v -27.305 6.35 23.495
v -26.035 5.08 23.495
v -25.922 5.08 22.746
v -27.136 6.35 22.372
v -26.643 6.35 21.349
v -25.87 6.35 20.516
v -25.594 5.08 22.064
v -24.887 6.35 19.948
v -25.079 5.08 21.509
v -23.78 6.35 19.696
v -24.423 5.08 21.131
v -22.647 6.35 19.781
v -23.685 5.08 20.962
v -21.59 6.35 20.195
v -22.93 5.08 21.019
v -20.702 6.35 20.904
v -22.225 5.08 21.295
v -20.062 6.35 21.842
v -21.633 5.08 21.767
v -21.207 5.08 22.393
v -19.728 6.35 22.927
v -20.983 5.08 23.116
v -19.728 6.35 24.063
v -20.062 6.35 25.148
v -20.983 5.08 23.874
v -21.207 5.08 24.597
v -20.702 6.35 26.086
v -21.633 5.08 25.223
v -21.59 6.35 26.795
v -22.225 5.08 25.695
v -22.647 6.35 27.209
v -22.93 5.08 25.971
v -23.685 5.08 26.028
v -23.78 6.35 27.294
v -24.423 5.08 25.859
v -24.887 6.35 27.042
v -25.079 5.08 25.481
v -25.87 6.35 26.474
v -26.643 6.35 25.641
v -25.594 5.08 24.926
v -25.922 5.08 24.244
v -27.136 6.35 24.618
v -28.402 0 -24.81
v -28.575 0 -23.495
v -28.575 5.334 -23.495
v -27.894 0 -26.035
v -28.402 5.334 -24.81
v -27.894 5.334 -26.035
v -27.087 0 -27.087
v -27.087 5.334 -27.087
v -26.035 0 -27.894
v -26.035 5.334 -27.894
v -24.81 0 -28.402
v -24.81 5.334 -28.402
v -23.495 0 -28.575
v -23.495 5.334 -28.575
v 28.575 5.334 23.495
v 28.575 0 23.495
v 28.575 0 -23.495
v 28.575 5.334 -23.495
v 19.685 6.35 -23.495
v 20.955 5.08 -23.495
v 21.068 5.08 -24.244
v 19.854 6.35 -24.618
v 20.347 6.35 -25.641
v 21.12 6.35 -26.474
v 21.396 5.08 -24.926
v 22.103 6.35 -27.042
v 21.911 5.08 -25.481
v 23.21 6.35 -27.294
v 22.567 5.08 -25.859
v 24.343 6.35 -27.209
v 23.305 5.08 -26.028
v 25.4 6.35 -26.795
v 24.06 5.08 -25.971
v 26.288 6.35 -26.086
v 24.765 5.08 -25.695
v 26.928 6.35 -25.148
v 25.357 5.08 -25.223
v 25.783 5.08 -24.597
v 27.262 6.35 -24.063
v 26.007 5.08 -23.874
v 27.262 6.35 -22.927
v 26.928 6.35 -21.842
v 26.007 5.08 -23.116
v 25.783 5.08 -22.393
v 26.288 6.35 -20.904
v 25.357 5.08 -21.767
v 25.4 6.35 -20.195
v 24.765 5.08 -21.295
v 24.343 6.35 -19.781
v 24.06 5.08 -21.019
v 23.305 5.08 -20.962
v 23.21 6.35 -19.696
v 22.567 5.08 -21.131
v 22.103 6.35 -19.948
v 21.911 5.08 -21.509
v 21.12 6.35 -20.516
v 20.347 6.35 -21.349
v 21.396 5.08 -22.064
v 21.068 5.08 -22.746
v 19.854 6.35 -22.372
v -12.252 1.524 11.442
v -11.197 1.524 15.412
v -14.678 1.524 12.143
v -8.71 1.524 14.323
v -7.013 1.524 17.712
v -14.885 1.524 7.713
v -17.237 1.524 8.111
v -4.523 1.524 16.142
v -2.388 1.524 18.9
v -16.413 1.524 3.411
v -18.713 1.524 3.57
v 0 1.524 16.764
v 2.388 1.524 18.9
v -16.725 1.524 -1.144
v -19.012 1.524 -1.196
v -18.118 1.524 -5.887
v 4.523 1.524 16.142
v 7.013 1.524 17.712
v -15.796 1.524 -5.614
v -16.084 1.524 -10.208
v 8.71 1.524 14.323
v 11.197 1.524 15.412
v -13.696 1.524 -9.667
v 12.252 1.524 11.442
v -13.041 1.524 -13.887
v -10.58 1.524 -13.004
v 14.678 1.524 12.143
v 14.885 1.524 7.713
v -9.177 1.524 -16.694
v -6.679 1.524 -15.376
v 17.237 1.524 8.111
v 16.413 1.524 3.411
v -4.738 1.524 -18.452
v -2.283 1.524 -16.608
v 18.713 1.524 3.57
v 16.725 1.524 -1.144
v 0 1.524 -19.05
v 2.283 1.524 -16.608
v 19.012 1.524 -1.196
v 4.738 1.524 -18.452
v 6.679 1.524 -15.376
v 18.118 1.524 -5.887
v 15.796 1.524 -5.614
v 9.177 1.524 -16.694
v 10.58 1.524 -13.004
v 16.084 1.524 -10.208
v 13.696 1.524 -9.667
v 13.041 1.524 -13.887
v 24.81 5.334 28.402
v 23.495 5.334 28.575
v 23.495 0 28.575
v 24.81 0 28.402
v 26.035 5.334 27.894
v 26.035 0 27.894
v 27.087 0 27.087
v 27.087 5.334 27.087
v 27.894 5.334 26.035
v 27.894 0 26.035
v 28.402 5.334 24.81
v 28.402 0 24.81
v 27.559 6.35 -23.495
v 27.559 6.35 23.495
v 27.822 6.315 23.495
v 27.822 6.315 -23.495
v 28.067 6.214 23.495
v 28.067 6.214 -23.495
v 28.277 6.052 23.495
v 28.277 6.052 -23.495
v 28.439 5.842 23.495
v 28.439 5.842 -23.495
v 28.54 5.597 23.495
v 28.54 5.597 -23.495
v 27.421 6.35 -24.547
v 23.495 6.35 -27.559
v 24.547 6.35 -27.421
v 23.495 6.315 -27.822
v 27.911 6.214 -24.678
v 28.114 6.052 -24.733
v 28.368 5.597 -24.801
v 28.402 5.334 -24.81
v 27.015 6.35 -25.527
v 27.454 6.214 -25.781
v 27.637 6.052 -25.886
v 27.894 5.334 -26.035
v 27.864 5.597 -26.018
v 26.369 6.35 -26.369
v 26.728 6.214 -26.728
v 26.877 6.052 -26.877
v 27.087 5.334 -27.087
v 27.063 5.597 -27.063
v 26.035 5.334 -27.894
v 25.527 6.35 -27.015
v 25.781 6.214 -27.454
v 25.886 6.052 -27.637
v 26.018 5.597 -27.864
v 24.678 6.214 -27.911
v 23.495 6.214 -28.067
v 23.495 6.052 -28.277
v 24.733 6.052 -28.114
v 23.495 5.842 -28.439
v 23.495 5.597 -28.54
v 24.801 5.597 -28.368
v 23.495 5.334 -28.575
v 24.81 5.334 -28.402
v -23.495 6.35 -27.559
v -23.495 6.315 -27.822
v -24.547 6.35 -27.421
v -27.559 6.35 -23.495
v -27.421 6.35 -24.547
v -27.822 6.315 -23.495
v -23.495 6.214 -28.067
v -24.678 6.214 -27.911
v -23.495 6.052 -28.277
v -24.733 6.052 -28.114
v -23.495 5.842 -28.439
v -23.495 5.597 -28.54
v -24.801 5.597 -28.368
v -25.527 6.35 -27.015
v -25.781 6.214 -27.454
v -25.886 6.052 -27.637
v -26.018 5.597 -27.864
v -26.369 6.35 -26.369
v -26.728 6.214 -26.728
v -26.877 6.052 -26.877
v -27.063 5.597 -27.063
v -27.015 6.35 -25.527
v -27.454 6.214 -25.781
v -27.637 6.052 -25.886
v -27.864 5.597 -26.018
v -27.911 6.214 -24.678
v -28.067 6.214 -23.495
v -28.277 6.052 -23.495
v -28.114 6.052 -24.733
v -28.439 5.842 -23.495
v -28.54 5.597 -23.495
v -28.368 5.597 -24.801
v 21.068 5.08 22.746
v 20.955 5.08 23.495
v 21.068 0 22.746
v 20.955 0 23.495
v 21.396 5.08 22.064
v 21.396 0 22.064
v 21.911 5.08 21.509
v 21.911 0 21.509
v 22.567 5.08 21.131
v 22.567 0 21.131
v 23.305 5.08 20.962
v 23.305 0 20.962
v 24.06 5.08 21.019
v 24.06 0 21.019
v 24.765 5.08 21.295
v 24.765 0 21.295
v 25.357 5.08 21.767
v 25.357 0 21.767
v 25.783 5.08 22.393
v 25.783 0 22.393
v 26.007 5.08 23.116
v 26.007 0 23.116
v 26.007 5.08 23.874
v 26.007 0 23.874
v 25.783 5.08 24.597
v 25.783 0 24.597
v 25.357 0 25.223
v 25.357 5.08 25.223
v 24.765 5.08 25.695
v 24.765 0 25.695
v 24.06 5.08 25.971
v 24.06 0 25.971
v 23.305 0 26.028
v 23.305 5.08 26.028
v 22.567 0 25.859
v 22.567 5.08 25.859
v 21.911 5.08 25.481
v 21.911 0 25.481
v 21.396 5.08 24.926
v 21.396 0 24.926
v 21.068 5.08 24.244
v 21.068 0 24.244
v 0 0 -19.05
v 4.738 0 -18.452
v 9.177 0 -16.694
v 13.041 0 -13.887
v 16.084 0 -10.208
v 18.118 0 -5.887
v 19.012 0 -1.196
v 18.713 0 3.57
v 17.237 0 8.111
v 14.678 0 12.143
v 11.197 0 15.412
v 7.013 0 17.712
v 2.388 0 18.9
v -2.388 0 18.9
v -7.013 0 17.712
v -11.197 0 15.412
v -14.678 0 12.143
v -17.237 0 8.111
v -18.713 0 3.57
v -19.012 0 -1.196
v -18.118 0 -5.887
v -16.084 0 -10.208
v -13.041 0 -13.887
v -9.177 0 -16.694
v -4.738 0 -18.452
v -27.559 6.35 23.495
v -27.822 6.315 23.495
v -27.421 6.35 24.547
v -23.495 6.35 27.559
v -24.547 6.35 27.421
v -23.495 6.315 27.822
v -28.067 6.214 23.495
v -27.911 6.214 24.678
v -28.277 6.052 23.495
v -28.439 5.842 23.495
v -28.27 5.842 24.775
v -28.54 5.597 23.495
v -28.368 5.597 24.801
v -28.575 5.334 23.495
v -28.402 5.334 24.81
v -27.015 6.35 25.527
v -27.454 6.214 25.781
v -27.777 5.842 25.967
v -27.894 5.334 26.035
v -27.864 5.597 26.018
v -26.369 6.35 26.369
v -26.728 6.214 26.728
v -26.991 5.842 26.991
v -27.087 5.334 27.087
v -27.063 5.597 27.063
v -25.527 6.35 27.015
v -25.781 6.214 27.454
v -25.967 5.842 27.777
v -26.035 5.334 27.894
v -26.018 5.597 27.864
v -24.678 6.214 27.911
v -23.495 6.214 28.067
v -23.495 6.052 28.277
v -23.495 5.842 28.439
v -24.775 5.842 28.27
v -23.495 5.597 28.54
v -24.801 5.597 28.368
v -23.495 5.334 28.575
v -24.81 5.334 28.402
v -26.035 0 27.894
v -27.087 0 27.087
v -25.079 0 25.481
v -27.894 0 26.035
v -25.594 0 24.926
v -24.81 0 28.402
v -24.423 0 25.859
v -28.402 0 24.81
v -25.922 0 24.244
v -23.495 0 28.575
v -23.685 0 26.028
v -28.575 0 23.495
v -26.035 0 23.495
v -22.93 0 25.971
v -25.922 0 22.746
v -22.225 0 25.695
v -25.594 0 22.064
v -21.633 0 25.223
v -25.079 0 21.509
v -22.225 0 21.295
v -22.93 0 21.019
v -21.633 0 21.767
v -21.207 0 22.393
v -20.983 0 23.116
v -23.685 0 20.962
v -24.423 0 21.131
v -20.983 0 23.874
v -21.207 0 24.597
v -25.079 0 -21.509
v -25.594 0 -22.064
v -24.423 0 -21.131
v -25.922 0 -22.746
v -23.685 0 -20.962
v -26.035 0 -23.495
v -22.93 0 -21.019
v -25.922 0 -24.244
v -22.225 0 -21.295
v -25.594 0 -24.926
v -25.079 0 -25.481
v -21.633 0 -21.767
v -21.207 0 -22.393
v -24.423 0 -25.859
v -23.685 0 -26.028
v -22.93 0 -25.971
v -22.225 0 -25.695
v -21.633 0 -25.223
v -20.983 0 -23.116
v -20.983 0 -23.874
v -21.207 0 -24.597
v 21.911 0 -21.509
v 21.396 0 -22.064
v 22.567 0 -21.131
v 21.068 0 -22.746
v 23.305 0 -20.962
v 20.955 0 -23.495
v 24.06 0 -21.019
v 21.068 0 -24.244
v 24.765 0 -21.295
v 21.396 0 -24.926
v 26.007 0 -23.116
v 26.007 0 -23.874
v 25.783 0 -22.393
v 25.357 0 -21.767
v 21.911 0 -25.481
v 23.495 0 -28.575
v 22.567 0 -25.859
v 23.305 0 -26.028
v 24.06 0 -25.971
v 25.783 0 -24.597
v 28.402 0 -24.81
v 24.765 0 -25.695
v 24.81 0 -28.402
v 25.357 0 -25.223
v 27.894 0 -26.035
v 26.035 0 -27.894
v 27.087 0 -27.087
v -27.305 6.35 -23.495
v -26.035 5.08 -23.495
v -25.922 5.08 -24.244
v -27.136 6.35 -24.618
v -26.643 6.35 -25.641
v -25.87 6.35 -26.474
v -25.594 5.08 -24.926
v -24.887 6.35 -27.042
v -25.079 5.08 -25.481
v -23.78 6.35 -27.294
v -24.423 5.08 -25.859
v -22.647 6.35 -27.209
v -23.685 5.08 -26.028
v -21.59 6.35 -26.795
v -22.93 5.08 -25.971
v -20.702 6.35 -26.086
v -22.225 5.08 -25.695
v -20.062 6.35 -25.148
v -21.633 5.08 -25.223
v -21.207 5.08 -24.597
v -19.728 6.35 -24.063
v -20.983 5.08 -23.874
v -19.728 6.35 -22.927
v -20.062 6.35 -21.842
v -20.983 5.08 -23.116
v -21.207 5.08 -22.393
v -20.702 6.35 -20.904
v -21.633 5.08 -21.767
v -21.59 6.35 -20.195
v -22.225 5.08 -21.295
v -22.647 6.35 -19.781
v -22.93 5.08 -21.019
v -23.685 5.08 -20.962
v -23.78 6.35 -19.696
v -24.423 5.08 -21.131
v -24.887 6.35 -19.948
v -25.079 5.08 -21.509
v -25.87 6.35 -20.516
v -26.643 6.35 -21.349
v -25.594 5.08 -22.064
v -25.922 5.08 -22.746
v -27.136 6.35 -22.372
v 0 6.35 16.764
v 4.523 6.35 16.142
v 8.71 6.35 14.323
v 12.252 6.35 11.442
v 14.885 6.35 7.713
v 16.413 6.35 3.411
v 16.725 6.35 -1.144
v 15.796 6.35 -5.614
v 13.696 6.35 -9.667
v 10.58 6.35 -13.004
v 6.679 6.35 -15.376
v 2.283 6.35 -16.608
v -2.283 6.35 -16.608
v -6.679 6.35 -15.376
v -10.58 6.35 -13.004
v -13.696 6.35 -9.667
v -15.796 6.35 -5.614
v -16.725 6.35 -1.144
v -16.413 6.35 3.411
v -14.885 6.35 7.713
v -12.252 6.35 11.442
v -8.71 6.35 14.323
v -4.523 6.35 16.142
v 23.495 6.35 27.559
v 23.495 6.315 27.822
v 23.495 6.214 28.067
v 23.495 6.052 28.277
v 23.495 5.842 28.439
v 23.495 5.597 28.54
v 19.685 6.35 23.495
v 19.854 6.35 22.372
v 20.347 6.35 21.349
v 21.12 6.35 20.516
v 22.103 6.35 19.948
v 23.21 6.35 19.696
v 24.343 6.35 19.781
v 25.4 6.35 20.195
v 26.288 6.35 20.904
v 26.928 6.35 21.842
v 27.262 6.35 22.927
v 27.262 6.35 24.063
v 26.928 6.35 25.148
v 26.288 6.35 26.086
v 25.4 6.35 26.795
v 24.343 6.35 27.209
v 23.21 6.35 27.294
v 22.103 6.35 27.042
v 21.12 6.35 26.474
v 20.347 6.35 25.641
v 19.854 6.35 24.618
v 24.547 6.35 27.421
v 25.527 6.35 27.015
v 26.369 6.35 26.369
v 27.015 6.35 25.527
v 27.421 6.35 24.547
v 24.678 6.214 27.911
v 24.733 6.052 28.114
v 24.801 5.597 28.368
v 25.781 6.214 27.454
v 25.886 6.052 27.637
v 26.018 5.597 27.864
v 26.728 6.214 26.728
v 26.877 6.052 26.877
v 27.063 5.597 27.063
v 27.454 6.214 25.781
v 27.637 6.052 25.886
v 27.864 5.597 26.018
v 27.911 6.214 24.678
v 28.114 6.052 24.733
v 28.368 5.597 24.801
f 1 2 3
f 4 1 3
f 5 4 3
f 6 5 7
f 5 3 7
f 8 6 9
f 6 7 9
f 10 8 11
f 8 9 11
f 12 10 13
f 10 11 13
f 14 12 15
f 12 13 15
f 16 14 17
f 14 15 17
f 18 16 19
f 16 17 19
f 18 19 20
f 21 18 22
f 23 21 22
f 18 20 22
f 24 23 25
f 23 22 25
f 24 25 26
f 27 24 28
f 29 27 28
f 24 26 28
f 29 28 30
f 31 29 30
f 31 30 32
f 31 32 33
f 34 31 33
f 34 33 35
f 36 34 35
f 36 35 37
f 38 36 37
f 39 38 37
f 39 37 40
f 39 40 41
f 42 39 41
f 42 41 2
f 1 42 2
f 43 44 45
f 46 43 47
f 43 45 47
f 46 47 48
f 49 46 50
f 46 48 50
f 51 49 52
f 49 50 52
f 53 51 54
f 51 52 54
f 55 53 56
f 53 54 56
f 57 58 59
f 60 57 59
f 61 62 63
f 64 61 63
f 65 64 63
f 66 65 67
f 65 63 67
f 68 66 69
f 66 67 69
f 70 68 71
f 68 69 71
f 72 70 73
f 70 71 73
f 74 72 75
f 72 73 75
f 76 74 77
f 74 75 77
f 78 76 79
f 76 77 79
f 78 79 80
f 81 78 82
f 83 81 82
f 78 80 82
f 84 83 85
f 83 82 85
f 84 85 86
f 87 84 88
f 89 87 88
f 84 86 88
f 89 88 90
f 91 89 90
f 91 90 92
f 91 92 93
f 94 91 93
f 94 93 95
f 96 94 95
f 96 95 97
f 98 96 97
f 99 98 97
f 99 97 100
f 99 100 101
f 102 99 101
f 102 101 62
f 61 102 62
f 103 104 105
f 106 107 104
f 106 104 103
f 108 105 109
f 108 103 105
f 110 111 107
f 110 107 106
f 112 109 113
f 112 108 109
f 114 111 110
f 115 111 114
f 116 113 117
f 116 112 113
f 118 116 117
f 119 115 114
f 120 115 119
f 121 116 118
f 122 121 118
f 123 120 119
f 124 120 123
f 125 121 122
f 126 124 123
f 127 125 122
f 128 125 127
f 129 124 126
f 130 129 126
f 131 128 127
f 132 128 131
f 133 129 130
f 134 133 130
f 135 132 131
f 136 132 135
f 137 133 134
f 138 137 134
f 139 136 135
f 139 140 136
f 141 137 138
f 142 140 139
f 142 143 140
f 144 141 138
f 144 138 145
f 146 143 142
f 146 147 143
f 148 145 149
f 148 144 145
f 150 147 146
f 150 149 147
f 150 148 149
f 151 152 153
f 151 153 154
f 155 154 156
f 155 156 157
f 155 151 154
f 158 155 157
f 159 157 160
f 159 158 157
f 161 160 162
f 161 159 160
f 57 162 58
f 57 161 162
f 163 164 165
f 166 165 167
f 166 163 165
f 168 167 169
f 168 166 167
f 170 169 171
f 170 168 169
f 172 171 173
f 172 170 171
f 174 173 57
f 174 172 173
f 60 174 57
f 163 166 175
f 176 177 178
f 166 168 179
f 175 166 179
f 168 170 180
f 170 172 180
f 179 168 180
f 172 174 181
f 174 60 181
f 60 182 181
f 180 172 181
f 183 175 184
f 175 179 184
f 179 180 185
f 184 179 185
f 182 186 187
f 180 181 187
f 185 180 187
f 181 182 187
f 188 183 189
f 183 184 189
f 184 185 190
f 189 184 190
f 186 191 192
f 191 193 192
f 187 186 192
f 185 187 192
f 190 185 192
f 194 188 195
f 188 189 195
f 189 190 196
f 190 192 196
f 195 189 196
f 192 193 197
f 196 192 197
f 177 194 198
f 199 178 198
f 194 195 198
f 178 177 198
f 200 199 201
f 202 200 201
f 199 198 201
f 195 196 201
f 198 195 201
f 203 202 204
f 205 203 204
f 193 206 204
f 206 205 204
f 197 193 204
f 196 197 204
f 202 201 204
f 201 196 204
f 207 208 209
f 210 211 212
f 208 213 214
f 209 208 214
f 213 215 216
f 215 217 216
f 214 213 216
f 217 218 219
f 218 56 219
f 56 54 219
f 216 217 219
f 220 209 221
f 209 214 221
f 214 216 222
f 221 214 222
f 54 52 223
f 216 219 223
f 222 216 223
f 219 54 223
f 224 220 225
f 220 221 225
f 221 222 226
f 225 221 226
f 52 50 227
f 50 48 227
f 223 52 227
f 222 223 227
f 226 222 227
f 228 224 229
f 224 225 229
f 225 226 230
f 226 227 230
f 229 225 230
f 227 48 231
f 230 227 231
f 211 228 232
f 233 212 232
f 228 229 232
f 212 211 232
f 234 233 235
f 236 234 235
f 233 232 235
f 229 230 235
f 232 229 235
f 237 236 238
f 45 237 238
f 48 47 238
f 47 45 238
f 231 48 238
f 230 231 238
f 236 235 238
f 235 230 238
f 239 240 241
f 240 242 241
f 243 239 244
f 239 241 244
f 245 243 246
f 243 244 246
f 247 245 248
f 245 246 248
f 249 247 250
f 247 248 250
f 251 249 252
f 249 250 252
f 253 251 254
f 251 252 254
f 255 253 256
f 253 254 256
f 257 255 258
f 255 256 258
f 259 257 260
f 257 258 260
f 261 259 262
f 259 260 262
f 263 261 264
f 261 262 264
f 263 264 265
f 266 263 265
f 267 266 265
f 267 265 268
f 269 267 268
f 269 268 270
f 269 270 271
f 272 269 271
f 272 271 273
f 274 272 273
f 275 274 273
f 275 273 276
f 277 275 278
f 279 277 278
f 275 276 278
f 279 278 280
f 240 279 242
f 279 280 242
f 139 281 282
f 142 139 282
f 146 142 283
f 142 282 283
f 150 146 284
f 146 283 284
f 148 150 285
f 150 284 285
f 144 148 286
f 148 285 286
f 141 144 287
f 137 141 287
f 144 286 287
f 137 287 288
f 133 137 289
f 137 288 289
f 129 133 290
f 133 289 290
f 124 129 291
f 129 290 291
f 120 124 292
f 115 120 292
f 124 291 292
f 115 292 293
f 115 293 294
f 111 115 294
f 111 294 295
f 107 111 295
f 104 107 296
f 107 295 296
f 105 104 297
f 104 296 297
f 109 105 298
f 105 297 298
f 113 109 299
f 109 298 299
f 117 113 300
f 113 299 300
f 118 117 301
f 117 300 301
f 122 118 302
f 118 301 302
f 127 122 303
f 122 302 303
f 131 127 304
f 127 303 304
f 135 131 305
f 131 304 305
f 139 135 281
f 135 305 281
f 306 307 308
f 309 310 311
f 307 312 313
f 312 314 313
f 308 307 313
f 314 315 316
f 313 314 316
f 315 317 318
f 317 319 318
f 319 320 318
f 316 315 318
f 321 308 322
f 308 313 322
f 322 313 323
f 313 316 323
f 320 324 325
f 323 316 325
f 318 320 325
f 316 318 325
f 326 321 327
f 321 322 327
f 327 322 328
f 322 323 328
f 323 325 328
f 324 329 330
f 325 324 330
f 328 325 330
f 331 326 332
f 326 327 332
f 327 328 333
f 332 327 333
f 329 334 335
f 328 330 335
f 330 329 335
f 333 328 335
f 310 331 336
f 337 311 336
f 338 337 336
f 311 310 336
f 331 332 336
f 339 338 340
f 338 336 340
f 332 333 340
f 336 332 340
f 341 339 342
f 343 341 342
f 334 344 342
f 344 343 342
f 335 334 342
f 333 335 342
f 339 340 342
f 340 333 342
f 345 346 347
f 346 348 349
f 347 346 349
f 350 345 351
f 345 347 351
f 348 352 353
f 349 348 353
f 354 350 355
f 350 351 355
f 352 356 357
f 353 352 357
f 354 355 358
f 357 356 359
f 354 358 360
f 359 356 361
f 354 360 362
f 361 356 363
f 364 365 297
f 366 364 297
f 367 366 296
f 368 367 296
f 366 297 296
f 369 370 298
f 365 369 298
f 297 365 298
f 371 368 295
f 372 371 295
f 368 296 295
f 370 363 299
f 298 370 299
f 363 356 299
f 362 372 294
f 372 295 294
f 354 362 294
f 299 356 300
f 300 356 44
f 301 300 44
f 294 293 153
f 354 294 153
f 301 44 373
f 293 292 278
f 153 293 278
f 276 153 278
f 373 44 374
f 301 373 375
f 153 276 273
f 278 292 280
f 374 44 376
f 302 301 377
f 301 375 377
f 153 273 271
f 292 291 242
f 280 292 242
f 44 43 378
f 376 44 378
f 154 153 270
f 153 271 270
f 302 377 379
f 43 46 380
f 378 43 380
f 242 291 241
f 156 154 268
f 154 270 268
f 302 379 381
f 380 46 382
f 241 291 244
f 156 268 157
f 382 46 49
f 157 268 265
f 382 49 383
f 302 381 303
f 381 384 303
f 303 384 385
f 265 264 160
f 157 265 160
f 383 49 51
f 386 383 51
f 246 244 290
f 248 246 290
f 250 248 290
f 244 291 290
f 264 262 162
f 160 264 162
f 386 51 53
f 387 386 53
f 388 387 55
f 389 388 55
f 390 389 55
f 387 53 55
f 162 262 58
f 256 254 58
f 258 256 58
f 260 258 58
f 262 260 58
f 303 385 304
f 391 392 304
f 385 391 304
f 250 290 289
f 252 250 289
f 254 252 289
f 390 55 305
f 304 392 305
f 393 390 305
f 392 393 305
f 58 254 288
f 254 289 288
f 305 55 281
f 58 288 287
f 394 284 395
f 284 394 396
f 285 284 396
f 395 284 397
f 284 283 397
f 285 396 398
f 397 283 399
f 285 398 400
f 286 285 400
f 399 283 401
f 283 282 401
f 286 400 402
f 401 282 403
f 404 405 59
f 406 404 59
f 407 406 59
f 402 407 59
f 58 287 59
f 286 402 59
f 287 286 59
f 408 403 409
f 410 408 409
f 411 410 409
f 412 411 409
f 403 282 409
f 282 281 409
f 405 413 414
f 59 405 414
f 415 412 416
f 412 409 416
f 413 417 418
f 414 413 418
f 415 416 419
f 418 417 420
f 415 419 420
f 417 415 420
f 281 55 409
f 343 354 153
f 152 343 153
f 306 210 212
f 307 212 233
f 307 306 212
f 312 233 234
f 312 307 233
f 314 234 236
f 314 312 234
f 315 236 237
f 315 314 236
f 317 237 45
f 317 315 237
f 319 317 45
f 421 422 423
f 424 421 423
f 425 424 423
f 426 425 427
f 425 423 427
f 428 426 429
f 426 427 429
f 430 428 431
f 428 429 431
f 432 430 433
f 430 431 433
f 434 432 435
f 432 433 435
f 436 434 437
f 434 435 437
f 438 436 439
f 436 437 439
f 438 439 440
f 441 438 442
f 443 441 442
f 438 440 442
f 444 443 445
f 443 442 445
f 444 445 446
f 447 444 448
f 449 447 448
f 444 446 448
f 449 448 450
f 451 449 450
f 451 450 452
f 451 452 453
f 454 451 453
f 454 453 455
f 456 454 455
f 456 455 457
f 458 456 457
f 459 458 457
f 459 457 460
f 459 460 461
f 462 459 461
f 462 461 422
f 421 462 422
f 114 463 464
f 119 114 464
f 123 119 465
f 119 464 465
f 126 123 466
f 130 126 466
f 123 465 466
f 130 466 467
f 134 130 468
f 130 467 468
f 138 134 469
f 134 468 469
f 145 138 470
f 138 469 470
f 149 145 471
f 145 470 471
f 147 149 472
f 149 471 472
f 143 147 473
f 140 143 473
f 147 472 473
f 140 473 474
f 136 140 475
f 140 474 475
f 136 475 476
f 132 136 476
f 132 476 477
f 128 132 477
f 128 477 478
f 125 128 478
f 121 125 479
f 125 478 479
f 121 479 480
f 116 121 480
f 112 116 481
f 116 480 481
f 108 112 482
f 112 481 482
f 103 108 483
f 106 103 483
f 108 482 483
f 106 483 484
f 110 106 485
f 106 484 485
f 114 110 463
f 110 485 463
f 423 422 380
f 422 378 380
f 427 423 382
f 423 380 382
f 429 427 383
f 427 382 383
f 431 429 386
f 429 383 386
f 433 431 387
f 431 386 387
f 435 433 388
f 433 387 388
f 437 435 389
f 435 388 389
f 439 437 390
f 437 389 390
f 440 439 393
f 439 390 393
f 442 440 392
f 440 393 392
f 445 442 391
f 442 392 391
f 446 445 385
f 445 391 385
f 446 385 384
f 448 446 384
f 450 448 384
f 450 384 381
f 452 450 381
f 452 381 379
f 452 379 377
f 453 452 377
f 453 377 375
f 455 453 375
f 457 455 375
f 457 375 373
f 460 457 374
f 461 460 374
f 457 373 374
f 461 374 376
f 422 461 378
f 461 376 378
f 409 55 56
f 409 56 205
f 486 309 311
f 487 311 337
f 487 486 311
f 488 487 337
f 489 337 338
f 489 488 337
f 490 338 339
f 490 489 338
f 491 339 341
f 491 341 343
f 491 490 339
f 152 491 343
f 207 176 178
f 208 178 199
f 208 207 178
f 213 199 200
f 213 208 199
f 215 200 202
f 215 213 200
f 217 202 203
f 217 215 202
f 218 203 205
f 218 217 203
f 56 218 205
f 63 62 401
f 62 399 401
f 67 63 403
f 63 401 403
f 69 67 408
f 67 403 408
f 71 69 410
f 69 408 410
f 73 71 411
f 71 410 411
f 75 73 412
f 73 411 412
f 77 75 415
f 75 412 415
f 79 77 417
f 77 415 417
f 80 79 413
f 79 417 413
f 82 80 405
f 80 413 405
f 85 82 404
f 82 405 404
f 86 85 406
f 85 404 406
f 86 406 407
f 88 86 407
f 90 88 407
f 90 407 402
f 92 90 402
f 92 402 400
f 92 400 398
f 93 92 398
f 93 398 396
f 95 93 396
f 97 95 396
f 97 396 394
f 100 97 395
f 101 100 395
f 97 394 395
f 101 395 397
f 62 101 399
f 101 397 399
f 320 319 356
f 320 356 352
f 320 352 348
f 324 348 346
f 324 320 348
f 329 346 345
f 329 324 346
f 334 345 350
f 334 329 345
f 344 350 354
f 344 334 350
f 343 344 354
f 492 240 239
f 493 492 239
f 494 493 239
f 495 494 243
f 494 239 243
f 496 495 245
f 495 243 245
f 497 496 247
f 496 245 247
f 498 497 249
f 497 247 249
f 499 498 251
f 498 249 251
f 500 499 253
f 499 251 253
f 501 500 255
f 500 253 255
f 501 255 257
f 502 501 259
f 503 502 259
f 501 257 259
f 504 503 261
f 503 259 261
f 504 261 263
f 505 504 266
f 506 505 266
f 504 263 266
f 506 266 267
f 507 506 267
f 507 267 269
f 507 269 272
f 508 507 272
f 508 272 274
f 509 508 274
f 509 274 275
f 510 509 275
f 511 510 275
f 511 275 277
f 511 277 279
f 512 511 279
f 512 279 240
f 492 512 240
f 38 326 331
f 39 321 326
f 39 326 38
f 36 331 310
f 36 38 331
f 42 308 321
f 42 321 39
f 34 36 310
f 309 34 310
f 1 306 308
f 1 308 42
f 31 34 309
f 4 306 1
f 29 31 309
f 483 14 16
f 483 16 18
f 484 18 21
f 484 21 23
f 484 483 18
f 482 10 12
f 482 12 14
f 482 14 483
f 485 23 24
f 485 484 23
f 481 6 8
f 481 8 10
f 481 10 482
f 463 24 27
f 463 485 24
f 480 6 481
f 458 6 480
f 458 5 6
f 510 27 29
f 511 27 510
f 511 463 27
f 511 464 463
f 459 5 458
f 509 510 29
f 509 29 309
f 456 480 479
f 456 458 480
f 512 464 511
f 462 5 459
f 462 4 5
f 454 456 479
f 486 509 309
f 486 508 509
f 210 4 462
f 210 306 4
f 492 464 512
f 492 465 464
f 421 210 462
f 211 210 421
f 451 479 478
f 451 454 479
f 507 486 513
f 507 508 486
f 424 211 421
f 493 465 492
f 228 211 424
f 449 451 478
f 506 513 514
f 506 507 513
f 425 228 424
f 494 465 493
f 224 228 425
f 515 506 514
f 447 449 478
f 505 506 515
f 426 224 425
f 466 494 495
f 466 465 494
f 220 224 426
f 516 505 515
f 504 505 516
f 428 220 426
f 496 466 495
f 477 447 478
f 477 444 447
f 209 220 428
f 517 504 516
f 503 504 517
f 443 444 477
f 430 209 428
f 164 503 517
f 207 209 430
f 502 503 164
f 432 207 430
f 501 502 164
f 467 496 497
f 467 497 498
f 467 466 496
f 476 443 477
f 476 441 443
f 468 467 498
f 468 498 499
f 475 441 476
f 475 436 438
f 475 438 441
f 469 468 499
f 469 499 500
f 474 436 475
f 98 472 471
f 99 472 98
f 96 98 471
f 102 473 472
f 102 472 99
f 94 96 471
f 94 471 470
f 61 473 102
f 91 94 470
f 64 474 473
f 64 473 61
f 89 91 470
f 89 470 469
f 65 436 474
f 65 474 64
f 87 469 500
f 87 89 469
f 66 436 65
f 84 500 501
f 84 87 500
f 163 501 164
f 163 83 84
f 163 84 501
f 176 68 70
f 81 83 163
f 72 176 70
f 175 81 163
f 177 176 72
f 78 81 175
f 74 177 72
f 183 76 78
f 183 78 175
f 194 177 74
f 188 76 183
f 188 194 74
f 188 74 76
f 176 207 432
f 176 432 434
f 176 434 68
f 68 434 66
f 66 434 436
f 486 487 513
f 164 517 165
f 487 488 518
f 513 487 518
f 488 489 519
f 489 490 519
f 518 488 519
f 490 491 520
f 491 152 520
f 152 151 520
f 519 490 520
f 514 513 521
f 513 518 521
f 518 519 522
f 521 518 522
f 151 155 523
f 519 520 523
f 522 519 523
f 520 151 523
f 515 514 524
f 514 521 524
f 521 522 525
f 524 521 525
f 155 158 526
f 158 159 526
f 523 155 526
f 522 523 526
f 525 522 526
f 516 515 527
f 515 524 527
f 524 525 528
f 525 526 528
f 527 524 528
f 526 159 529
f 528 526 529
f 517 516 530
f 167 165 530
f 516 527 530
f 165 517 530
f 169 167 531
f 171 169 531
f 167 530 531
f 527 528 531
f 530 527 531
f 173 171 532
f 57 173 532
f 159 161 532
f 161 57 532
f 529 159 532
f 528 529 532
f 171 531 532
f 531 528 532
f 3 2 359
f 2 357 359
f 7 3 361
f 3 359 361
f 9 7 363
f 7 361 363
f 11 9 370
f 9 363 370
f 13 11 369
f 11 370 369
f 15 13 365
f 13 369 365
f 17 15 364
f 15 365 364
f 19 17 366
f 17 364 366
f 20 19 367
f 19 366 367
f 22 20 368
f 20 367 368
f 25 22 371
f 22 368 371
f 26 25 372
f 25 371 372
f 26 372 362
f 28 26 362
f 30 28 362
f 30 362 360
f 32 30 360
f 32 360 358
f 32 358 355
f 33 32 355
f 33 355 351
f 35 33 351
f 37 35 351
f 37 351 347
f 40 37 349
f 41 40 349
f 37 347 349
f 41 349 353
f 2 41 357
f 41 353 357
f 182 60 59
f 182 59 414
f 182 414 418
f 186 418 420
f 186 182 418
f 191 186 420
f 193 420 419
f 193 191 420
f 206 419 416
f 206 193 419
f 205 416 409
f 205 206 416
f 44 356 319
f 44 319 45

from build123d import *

# Parameters (mm, degrees)
SKETCH1_W                                         = 57.15
SKETCH1_H                                         = 57.15
BOSS_EXTRUDE2_DEPTH                               = 6.35
FILLET1_R                                         = 5.08
SKETCH2_R                                         = 19.05
CUT_EXTRUDE1_DEPTH                                = 1.524
CSK_FOR_1_FLAT_HEAD_MACHINE_SCREW_100_D           = 5.08
CSK_FOR_1_FLAT_HEAD_MACHINE_SCREW_100_CSINK_D     = 7.62
CSK_FOR_1_FLAT_HEAD_MACHINE_SCREW_100_CSINK_ANGLE = 90
SKETCH14_R                                        = 3.175
CUT_EXTRUDE2_DEPTH                                = 4.826
FILLET2_R                                         = 1.016
SKETCH15_R                                        = 16.764
CUT_EXTRUDE4_DEPTH                                = 4.826


with BuildPart() as part:
    # Sketch1 → Boss-Extrude2 (new body)
    with BuildSketch(Plane(origin=(0, 0, 0), x_dir=(1, 0, 0), z_dir=(0, 1, 0))):
        Rectangle(SKETCH1_W, SKETCH1_H)
    extrude(amount=BOSS_EXTRUDE2_DEPTH)

    # Fillet1
    fillet1_edges = [part.edges().sort_by_distance(p)[0] for p in [
        (28.575, 3.175, 28.575),
        (-28.575, 3.175, 28.575),
        (-28.575, 3.175, -28.575),
        (28.575, 3.175, -28.575),
    ]]
    fillet(fillet1_edges, radius=FILLET1_R)

    # Sketch2 → Cut-Extrude1 (cut)
    with BuildSketch(Plane.XZ):
        with Locations(Location((0, 0, 0), (0, 0, 270))):
            Circle(SKETCH2_R)
    extrude(amount=-CUT_EXTRUDE1_DEPTH, mode=Mode.SUBTRACT)

    # CSK for #1 Flat Head Machine Screw (100)2 (through all)
    with Locations(Plane(origin=(0, 6.35, 0), x_dir=(1, 0, 0), z_dir=(0, 1, 0))):
        with Locations((-23.495, 23.495), (23.495, 23.495), (-23.495, -23.495), (23.495, -23.495)):
            CounterSinkHole(CSK_FOR_1_FLAT_HEAD_MACHINE_SCREW_100_D / 2, CSK_FOR_1_FLAT_HEAD_MACHINE_SCREW_100_CSINK_D / 2, counter_sink_angle=CSK_FOR_1_FLAT_HEAD_MACHINE_SCREW_100_CSINK_ANGLE)

    # Sketch14 → Cut-Extrude2 (cut)
    with BuildSketch(Plane(origin=(0, 6.35, 0), x_dir=(1, 0, 0), z_dir=(0, 1, 0))):
        with Locations(Location((0, 0, 0), (0, 0, 270))):
            Circle(SKETCH14_R)
    extrude(amount=-CUT_EXTRUDE2_DEPTH, mode=Mode.SUBTRACT)

    # Fillet2
    fillet2_edges = [part.edges().sort_by_distance(p)[0] for p in [
        (0, 6.35, 28.575),
        (-28.575, 6.35, 0),
        (28.575, 6.35, 0),
        (0, 6.35, -28.575),
        (-27.087102448, 6.35, -27.087102448),
        (27.087102448, 6.35, -27.087102448),
        (27.087102448, 6.35, 27.087102448),
        (-27.087102448, 6.35, 27.087102448),
    ]]
    fillet(fillet2_edges, radius=FILLET2_R)

    # Sketch15 → Cut-Extrude4 (cut)
    with BuildSketch(Plane(origin=(0, 6.35, 0), x_dir=(1, 0, 0), z_dir=(0, 1, 0))):
        with Locations(Location((0, 0, 0), (0, 0, 270))):
            Circle(SKETCH15_R)
    extrude(amount=-CUT_EXTRUDE4_DEPTH, mode=Mode.SUBTRACT)


solid = part.part
